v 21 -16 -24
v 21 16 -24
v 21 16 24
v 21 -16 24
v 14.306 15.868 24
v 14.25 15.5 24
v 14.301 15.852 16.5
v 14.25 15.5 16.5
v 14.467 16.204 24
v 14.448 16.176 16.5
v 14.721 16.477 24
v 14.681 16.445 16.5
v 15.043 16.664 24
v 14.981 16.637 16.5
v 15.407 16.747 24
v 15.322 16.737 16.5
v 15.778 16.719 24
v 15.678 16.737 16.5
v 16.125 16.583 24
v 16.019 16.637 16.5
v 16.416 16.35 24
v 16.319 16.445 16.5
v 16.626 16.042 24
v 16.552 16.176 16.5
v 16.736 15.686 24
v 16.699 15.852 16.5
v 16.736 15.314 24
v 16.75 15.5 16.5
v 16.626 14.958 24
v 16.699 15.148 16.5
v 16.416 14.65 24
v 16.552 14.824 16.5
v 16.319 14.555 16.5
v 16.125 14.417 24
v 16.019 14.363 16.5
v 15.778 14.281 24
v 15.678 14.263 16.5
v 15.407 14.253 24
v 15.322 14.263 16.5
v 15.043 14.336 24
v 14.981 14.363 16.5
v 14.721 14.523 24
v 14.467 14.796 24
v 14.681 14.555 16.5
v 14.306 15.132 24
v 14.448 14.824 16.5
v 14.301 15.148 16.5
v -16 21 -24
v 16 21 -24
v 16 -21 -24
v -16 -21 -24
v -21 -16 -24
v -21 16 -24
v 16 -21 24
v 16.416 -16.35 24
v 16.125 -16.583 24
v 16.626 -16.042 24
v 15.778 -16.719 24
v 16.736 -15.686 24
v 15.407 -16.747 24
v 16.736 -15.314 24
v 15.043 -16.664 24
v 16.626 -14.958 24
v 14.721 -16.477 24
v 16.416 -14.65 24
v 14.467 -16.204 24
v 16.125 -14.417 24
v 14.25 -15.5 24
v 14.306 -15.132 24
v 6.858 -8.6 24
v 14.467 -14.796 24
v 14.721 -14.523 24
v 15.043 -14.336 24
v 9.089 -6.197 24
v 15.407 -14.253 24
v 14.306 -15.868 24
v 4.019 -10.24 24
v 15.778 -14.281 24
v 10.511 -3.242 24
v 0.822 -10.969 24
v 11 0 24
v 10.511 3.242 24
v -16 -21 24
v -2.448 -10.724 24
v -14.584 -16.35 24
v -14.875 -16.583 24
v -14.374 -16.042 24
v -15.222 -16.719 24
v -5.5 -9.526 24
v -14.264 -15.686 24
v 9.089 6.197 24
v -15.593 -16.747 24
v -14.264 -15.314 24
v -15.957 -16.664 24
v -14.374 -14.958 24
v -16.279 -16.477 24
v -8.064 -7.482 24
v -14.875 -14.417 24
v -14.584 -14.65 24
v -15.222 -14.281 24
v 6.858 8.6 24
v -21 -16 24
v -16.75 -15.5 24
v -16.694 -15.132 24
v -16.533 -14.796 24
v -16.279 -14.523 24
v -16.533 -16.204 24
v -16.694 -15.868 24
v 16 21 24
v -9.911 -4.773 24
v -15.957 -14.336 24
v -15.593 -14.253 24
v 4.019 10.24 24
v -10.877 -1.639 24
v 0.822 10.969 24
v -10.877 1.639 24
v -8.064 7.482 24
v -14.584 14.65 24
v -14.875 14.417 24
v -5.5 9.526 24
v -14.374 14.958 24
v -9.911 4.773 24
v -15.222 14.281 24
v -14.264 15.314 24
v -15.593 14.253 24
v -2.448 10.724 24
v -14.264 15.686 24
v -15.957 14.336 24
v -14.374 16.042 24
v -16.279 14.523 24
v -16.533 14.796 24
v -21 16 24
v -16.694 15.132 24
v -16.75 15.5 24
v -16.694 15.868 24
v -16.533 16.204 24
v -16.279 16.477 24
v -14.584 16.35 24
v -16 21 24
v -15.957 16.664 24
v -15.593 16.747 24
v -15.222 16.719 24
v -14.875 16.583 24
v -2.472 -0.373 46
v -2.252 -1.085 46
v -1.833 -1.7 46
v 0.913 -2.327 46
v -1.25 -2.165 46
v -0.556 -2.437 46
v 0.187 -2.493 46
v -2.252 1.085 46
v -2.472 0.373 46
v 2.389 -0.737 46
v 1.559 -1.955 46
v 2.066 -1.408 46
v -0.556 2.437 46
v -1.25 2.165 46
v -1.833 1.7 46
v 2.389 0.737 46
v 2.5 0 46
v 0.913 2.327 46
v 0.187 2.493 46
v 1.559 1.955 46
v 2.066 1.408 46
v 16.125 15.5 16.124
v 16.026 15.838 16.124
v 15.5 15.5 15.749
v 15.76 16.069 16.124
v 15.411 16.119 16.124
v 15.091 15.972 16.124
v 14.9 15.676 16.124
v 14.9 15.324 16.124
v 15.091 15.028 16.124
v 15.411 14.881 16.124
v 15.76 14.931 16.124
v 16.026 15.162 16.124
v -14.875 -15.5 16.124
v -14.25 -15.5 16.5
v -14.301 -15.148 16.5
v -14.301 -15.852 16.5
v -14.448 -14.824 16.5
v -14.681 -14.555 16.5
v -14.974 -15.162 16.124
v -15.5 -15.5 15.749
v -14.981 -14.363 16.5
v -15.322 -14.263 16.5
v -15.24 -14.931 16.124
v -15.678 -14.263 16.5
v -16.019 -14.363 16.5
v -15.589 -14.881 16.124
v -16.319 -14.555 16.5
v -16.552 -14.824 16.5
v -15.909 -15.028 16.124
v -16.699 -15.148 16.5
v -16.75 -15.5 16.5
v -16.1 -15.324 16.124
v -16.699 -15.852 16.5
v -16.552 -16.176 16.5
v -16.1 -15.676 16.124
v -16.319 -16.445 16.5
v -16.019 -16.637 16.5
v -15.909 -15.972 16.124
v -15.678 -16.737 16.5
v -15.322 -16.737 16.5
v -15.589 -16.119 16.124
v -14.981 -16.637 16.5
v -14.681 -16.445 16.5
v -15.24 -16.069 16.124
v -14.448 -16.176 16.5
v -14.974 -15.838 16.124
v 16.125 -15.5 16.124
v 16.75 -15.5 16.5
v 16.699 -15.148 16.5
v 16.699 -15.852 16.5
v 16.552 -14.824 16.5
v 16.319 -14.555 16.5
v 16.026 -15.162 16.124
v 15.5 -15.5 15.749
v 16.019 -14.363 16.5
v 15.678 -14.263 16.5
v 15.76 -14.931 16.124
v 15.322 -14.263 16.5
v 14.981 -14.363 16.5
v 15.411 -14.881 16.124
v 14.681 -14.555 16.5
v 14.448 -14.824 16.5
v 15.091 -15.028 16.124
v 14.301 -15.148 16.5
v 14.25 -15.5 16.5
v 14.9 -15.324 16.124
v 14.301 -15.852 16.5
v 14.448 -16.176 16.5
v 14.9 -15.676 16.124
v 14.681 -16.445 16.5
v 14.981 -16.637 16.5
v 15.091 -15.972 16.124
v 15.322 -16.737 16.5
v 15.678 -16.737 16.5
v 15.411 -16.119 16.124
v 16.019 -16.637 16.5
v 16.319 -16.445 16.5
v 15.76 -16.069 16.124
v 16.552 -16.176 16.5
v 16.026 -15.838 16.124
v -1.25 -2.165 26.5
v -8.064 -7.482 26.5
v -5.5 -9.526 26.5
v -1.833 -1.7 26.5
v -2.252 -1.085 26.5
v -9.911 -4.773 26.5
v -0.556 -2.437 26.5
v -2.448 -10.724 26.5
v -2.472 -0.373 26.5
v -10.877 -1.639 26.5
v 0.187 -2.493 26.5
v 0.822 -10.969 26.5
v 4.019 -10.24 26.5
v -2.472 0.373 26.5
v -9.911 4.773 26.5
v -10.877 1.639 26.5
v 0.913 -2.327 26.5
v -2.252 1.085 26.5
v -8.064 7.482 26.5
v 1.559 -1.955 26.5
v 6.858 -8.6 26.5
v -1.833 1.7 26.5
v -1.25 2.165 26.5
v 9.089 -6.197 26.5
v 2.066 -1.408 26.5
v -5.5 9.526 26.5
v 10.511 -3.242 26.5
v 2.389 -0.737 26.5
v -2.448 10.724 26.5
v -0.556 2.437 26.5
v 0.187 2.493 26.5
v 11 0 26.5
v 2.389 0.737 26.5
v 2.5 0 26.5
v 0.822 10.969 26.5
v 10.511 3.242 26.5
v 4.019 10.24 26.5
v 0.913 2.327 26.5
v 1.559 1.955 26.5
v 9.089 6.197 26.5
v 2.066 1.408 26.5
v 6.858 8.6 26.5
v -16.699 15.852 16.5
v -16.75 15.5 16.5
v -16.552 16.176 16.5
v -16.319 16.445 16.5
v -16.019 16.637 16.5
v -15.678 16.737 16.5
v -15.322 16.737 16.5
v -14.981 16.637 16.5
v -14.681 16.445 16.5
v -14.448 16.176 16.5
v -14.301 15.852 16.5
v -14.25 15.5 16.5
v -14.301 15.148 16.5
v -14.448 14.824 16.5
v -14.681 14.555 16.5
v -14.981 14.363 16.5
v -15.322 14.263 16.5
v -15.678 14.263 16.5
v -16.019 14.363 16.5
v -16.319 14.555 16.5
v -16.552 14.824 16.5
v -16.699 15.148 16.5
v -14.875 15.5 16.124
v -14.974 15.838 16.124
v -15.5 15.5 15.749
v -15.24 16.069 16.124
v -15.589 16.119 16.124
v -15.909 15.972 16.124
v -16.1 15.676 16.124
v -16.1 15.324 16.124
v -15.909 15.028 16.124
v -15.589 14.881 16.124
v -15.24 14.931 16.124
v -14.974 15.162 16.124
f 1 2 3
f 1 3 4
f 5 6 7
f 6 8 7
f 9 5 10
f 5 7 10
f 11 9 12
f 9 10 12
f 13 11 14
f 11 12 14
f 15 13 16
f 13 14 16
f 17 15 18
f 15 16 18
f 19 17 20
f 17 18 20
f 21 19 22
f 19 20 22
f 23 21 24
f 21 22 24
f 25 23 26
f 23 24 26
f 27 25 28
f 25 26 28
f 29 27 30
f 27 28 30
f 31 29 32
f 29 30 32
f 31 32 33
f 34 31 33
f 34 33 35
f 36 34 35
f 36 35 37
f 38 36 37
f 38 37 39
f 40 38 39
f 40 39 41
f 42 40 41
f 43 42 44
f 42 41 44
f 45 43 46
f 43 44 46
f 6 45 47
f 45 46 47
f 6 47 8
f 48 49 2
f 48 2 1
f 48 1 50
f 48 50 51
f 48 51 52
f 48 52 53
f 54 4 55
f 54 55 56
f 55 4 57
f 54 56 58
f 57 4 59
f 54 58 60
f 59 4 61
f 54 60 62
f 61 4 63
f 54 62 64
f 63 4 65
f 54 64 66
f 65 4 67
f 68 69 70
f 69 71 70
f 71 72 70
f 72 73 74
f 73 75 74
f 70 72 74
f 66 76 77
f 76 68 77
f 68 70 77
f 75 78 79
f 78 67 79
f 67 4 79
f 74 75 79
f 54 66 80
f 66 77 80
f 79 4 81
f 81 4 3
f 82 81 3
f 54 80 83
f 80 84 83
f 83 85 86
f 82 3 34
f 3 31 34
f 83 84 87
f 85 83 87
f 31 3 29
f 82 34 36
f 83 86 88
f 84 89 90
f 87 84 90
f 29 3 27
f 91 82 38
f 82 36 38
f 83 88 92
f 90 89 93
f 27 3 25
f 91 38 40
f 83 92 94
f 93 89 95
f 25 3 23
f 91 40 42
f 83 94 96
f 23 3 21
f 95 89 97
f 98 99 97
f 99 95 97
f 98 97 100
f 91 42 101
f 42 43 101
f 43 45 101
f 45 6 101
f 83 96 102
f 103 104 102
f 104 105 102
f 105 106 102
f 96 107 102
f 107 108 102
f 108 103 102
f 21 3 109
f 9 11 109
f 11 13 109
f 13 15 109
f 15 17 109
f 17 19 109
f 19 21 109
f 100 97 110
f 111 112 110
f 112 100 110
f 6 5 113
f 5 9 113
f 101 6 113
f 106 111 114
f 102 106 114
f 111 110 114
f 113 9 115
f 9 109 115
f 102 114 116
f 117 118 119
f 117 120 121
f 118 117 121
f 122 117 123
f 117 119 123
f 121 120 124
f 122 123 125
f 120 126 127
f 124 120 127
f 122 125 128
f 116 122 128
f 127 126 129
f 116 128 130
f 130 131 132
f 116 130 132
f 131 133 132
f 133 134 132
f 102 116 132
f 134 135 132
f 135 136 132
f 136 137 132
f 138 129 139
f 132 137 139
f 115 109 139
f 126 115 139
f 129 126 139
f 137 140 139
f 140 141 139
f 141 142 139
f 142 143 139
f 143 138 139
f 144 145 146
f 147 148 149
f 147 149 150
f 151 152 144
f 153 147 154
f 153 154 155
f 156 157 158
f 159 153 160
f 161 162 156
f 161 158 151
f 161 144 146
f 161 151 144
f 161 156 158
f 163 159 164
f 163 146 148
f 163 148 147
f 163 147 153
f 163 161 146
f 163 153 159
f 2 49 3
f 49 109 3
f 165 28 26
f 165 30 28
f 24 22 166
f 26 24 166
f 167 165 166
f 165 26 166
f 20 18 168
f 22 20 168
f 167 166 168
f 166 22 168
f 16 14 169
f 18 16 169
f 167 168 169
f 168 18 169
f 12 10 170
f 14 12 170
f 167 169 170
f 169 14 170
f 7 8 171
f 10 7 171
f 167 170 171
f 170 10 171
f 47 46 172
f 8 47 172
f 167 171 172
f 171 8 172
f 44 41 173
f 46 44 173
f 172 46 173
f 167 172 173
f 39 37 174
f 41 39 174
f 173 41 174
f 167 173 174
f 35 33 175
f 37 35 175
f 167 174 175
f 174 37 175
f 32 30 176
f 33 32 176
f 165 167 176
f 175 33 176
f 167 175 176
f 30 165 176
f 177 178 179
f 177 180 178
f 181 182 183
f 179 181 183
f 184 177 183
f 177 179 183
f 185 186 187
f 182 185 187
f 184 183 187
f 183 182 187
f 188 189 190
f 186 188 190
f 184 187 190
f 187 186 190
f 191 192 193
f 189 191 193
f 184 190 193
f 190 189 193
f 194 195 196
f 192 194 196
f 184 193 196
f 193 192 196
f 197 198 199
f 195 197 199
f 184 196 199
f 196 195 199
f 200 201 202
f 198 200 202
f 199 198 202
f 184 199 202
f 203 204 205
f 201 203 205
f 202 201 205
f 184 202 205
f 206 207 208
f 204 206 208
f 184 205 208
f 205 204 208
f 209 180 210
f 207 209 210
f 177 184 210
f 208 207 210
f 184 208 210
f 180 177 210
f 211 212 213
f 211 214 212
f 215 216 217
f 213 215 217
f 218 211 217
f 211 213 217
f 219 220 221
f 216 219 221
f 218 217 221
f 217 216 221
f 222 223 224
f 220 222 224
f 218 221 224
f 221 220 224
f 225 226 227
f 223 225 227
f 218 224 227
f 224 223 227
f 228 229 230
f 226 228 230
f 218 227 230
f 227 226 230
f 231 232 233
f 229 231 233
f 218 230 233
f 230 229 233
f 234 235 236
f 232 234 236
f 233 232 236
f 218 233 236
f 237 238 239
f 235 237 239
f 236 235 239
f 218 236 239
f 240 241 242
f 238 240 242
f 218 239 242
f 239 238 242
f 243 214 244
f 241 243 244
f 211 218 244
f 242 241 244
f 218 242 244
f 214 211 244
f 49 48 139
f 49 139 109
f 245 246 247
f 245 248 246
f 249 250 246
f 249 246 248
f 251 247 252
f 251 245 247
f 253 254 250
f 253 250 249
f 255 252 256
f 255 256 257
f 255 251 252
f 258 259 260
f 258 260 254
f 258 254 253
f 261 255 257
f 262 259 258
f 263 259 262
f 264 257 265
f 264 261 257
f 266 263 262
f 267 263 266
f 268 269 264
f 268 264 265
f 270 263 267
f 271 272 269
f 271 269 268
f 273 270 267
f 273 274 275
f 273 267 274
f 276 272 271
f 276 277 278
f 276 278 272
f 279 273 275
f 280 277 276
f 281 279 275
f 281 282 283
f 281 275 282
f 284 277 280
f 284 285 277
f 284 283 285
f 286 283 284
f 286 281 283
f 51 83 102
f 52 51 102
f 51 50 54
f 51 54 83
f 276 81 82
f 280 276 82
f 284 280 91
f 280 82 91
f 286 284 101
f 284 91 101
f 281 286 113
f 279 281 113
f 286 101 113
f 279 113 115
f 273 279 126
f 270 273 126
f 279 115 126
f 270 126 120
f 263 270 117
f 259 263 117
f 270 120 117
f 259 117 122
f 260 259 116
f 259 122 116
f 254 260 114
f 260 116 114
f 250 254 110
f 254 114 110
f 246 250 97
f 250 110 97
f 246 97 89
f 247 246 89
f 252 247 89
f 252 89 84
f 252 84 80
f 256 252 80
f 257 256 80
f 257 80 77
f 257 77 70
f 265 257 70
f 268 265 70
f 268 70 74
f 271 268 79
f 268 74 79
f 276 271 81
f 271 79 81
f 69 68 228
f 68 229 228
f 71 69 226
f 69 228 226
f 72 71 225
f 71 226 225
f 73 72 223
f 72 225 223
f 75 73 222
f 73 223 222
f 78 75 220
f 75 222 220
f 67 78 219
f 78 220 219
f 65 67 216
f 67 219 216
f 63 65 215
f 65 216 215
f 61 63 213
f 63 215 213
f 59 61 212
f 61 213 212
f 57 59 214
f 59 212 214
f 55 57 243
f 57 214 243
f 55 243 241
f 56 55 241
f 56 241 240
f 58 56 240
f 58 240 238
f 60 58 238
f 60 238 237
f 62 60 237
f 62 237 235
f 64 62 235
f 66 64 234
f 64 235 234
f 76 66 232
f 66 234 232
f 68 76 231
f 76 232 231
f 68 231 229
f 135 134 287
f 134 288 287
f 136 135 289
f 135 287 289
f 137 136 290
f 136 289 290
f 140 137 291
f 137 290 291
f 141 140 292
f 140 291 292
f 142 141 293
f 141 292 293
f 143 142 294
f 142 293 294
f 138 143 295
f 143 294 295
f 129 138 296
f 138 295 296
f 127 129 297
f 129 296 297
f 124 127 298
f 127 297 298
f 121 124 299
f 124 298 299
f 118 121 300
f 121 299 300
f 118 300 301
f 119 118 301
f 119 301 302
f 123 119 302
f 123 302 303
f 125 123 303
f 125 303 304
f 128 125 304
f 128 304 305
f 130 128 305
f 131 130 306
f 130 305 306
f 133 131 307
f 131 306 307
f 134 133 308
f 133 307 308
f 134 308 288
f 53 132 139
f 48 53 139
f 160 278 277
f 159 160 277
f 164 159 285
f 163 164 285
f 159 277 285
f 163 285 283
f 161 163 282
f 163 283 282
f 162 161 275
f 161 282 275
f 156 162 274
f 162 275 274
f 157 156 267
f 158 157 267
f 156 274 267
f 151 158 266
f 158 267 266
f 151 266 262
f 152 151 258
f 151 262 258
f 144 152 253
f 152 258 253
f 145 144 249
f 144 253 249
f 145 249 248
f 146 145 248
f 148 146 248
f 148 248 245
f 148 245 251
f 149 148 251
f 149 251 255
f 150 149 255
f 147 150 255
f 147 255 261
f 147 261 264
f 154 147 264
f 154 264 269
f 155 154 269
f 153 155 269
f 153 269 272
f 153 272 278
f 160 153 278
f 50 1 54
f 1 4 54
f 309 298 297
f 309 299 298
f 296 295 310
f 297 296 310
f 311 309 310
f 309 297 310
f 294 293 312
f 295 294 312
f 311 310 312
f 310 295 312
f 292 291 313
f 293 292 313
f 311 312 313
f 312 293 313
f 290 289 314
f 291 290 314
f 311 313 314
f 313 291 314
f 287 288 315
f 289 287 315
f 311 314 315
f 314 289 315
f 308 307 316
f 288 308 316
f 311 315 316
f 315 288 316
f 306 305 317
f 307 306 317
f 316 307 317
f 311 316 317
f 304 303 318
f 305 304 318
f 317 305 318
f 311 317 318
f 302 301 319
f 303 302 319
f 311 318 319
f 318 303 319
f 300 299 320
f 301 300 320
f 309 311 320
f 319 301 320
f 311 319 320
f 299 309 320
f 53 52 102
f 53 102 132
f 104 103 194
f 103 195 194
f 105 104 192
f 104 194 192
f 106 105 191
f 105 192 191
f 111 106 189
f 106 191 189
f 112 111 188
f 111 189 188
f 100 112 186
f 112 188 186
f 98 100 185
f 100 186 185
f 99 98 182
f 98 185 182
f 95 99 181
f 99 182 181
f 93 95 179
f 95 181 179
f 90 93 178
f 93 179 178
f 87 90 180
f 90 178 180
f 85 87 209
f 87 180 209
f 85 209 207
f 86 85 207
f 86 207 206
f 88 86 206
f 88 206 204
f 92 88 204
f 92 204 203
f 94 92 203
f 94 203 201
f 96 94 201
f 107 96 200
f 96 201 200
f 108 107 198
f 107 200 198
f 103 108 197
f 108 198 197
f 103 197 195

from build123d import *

# Parameters (mm, degrees)
EXTRUDE_1_DEPTH        = 24
SKETCH_2_R             = 11
SKETCH_2_R_2           = 2.5
EXTRUDE_2_DEPTH        = 2.5
SKETCH_2_2_R           = 2.5
EXTRUDE_3_DEPTH        = 22
HOLE_WIZARD_M3_1_D     = 2.5
HOLE_WIZARD_M3_1_DEPTH = 7.5
HOLE_WIZARD_M3_1_TIP   = 0.751075774


with BuildPart() as part:
    # 草图1 → 凸台-拉伸1 (new, symmetric)
    with BuildSketch(Plane.XY):
        Polygon((-21, 16), (-16, 21), (16, 21), (21, 16), (21, -16), (16, -21), (-16, -21), (-21, -16), align=None)
    extrude(amount=EXTRUDE_1_DEPTH, both=True)

    # 草图2 → 凸台-拉伸2 (add)
    with BuildSketch(Plane.XY.offset(24)):
        Circle(SKETCH_2_R)
        Circle(SKETCH_2_R_2, mode=Mode.SUBTRACT)
    extrude(amount=EXTRUDE_2_DEPTH)

    # 草图2<2> → 凸台-拉伸3 (add)
    with BuildSketch(Plane.XY.offset(24)):
        Circle(SKETCH_2_2_R)
    extrude(amount=EXTRUDE_3_DEPTH)

    # M3 螺纹孔1
    with Locations(Plane.XY.offset(24)):
        with Locations((-15.5, 15.5), (15.5, 15.5), (15.5, -15.5), (-15.5, -15.5)):
            Hole(HOLE_WIZARD_M3_1_D / 2, depth=HOLE_WIZARD_M3_1_DEPTH)
            with Locations((0, 0, -(HOLE_WIZARD_M3_1_DEPTH + HOLE_WIZARD_M3_1_TIP / 2))):  # 118° drill point
                Cone(0, HOLE_WIZARD_M3_1_D / 2, HOLE_WIZARD_M3_1_TIP, mode=Mode.SUBTRACT)


solid = part.part
